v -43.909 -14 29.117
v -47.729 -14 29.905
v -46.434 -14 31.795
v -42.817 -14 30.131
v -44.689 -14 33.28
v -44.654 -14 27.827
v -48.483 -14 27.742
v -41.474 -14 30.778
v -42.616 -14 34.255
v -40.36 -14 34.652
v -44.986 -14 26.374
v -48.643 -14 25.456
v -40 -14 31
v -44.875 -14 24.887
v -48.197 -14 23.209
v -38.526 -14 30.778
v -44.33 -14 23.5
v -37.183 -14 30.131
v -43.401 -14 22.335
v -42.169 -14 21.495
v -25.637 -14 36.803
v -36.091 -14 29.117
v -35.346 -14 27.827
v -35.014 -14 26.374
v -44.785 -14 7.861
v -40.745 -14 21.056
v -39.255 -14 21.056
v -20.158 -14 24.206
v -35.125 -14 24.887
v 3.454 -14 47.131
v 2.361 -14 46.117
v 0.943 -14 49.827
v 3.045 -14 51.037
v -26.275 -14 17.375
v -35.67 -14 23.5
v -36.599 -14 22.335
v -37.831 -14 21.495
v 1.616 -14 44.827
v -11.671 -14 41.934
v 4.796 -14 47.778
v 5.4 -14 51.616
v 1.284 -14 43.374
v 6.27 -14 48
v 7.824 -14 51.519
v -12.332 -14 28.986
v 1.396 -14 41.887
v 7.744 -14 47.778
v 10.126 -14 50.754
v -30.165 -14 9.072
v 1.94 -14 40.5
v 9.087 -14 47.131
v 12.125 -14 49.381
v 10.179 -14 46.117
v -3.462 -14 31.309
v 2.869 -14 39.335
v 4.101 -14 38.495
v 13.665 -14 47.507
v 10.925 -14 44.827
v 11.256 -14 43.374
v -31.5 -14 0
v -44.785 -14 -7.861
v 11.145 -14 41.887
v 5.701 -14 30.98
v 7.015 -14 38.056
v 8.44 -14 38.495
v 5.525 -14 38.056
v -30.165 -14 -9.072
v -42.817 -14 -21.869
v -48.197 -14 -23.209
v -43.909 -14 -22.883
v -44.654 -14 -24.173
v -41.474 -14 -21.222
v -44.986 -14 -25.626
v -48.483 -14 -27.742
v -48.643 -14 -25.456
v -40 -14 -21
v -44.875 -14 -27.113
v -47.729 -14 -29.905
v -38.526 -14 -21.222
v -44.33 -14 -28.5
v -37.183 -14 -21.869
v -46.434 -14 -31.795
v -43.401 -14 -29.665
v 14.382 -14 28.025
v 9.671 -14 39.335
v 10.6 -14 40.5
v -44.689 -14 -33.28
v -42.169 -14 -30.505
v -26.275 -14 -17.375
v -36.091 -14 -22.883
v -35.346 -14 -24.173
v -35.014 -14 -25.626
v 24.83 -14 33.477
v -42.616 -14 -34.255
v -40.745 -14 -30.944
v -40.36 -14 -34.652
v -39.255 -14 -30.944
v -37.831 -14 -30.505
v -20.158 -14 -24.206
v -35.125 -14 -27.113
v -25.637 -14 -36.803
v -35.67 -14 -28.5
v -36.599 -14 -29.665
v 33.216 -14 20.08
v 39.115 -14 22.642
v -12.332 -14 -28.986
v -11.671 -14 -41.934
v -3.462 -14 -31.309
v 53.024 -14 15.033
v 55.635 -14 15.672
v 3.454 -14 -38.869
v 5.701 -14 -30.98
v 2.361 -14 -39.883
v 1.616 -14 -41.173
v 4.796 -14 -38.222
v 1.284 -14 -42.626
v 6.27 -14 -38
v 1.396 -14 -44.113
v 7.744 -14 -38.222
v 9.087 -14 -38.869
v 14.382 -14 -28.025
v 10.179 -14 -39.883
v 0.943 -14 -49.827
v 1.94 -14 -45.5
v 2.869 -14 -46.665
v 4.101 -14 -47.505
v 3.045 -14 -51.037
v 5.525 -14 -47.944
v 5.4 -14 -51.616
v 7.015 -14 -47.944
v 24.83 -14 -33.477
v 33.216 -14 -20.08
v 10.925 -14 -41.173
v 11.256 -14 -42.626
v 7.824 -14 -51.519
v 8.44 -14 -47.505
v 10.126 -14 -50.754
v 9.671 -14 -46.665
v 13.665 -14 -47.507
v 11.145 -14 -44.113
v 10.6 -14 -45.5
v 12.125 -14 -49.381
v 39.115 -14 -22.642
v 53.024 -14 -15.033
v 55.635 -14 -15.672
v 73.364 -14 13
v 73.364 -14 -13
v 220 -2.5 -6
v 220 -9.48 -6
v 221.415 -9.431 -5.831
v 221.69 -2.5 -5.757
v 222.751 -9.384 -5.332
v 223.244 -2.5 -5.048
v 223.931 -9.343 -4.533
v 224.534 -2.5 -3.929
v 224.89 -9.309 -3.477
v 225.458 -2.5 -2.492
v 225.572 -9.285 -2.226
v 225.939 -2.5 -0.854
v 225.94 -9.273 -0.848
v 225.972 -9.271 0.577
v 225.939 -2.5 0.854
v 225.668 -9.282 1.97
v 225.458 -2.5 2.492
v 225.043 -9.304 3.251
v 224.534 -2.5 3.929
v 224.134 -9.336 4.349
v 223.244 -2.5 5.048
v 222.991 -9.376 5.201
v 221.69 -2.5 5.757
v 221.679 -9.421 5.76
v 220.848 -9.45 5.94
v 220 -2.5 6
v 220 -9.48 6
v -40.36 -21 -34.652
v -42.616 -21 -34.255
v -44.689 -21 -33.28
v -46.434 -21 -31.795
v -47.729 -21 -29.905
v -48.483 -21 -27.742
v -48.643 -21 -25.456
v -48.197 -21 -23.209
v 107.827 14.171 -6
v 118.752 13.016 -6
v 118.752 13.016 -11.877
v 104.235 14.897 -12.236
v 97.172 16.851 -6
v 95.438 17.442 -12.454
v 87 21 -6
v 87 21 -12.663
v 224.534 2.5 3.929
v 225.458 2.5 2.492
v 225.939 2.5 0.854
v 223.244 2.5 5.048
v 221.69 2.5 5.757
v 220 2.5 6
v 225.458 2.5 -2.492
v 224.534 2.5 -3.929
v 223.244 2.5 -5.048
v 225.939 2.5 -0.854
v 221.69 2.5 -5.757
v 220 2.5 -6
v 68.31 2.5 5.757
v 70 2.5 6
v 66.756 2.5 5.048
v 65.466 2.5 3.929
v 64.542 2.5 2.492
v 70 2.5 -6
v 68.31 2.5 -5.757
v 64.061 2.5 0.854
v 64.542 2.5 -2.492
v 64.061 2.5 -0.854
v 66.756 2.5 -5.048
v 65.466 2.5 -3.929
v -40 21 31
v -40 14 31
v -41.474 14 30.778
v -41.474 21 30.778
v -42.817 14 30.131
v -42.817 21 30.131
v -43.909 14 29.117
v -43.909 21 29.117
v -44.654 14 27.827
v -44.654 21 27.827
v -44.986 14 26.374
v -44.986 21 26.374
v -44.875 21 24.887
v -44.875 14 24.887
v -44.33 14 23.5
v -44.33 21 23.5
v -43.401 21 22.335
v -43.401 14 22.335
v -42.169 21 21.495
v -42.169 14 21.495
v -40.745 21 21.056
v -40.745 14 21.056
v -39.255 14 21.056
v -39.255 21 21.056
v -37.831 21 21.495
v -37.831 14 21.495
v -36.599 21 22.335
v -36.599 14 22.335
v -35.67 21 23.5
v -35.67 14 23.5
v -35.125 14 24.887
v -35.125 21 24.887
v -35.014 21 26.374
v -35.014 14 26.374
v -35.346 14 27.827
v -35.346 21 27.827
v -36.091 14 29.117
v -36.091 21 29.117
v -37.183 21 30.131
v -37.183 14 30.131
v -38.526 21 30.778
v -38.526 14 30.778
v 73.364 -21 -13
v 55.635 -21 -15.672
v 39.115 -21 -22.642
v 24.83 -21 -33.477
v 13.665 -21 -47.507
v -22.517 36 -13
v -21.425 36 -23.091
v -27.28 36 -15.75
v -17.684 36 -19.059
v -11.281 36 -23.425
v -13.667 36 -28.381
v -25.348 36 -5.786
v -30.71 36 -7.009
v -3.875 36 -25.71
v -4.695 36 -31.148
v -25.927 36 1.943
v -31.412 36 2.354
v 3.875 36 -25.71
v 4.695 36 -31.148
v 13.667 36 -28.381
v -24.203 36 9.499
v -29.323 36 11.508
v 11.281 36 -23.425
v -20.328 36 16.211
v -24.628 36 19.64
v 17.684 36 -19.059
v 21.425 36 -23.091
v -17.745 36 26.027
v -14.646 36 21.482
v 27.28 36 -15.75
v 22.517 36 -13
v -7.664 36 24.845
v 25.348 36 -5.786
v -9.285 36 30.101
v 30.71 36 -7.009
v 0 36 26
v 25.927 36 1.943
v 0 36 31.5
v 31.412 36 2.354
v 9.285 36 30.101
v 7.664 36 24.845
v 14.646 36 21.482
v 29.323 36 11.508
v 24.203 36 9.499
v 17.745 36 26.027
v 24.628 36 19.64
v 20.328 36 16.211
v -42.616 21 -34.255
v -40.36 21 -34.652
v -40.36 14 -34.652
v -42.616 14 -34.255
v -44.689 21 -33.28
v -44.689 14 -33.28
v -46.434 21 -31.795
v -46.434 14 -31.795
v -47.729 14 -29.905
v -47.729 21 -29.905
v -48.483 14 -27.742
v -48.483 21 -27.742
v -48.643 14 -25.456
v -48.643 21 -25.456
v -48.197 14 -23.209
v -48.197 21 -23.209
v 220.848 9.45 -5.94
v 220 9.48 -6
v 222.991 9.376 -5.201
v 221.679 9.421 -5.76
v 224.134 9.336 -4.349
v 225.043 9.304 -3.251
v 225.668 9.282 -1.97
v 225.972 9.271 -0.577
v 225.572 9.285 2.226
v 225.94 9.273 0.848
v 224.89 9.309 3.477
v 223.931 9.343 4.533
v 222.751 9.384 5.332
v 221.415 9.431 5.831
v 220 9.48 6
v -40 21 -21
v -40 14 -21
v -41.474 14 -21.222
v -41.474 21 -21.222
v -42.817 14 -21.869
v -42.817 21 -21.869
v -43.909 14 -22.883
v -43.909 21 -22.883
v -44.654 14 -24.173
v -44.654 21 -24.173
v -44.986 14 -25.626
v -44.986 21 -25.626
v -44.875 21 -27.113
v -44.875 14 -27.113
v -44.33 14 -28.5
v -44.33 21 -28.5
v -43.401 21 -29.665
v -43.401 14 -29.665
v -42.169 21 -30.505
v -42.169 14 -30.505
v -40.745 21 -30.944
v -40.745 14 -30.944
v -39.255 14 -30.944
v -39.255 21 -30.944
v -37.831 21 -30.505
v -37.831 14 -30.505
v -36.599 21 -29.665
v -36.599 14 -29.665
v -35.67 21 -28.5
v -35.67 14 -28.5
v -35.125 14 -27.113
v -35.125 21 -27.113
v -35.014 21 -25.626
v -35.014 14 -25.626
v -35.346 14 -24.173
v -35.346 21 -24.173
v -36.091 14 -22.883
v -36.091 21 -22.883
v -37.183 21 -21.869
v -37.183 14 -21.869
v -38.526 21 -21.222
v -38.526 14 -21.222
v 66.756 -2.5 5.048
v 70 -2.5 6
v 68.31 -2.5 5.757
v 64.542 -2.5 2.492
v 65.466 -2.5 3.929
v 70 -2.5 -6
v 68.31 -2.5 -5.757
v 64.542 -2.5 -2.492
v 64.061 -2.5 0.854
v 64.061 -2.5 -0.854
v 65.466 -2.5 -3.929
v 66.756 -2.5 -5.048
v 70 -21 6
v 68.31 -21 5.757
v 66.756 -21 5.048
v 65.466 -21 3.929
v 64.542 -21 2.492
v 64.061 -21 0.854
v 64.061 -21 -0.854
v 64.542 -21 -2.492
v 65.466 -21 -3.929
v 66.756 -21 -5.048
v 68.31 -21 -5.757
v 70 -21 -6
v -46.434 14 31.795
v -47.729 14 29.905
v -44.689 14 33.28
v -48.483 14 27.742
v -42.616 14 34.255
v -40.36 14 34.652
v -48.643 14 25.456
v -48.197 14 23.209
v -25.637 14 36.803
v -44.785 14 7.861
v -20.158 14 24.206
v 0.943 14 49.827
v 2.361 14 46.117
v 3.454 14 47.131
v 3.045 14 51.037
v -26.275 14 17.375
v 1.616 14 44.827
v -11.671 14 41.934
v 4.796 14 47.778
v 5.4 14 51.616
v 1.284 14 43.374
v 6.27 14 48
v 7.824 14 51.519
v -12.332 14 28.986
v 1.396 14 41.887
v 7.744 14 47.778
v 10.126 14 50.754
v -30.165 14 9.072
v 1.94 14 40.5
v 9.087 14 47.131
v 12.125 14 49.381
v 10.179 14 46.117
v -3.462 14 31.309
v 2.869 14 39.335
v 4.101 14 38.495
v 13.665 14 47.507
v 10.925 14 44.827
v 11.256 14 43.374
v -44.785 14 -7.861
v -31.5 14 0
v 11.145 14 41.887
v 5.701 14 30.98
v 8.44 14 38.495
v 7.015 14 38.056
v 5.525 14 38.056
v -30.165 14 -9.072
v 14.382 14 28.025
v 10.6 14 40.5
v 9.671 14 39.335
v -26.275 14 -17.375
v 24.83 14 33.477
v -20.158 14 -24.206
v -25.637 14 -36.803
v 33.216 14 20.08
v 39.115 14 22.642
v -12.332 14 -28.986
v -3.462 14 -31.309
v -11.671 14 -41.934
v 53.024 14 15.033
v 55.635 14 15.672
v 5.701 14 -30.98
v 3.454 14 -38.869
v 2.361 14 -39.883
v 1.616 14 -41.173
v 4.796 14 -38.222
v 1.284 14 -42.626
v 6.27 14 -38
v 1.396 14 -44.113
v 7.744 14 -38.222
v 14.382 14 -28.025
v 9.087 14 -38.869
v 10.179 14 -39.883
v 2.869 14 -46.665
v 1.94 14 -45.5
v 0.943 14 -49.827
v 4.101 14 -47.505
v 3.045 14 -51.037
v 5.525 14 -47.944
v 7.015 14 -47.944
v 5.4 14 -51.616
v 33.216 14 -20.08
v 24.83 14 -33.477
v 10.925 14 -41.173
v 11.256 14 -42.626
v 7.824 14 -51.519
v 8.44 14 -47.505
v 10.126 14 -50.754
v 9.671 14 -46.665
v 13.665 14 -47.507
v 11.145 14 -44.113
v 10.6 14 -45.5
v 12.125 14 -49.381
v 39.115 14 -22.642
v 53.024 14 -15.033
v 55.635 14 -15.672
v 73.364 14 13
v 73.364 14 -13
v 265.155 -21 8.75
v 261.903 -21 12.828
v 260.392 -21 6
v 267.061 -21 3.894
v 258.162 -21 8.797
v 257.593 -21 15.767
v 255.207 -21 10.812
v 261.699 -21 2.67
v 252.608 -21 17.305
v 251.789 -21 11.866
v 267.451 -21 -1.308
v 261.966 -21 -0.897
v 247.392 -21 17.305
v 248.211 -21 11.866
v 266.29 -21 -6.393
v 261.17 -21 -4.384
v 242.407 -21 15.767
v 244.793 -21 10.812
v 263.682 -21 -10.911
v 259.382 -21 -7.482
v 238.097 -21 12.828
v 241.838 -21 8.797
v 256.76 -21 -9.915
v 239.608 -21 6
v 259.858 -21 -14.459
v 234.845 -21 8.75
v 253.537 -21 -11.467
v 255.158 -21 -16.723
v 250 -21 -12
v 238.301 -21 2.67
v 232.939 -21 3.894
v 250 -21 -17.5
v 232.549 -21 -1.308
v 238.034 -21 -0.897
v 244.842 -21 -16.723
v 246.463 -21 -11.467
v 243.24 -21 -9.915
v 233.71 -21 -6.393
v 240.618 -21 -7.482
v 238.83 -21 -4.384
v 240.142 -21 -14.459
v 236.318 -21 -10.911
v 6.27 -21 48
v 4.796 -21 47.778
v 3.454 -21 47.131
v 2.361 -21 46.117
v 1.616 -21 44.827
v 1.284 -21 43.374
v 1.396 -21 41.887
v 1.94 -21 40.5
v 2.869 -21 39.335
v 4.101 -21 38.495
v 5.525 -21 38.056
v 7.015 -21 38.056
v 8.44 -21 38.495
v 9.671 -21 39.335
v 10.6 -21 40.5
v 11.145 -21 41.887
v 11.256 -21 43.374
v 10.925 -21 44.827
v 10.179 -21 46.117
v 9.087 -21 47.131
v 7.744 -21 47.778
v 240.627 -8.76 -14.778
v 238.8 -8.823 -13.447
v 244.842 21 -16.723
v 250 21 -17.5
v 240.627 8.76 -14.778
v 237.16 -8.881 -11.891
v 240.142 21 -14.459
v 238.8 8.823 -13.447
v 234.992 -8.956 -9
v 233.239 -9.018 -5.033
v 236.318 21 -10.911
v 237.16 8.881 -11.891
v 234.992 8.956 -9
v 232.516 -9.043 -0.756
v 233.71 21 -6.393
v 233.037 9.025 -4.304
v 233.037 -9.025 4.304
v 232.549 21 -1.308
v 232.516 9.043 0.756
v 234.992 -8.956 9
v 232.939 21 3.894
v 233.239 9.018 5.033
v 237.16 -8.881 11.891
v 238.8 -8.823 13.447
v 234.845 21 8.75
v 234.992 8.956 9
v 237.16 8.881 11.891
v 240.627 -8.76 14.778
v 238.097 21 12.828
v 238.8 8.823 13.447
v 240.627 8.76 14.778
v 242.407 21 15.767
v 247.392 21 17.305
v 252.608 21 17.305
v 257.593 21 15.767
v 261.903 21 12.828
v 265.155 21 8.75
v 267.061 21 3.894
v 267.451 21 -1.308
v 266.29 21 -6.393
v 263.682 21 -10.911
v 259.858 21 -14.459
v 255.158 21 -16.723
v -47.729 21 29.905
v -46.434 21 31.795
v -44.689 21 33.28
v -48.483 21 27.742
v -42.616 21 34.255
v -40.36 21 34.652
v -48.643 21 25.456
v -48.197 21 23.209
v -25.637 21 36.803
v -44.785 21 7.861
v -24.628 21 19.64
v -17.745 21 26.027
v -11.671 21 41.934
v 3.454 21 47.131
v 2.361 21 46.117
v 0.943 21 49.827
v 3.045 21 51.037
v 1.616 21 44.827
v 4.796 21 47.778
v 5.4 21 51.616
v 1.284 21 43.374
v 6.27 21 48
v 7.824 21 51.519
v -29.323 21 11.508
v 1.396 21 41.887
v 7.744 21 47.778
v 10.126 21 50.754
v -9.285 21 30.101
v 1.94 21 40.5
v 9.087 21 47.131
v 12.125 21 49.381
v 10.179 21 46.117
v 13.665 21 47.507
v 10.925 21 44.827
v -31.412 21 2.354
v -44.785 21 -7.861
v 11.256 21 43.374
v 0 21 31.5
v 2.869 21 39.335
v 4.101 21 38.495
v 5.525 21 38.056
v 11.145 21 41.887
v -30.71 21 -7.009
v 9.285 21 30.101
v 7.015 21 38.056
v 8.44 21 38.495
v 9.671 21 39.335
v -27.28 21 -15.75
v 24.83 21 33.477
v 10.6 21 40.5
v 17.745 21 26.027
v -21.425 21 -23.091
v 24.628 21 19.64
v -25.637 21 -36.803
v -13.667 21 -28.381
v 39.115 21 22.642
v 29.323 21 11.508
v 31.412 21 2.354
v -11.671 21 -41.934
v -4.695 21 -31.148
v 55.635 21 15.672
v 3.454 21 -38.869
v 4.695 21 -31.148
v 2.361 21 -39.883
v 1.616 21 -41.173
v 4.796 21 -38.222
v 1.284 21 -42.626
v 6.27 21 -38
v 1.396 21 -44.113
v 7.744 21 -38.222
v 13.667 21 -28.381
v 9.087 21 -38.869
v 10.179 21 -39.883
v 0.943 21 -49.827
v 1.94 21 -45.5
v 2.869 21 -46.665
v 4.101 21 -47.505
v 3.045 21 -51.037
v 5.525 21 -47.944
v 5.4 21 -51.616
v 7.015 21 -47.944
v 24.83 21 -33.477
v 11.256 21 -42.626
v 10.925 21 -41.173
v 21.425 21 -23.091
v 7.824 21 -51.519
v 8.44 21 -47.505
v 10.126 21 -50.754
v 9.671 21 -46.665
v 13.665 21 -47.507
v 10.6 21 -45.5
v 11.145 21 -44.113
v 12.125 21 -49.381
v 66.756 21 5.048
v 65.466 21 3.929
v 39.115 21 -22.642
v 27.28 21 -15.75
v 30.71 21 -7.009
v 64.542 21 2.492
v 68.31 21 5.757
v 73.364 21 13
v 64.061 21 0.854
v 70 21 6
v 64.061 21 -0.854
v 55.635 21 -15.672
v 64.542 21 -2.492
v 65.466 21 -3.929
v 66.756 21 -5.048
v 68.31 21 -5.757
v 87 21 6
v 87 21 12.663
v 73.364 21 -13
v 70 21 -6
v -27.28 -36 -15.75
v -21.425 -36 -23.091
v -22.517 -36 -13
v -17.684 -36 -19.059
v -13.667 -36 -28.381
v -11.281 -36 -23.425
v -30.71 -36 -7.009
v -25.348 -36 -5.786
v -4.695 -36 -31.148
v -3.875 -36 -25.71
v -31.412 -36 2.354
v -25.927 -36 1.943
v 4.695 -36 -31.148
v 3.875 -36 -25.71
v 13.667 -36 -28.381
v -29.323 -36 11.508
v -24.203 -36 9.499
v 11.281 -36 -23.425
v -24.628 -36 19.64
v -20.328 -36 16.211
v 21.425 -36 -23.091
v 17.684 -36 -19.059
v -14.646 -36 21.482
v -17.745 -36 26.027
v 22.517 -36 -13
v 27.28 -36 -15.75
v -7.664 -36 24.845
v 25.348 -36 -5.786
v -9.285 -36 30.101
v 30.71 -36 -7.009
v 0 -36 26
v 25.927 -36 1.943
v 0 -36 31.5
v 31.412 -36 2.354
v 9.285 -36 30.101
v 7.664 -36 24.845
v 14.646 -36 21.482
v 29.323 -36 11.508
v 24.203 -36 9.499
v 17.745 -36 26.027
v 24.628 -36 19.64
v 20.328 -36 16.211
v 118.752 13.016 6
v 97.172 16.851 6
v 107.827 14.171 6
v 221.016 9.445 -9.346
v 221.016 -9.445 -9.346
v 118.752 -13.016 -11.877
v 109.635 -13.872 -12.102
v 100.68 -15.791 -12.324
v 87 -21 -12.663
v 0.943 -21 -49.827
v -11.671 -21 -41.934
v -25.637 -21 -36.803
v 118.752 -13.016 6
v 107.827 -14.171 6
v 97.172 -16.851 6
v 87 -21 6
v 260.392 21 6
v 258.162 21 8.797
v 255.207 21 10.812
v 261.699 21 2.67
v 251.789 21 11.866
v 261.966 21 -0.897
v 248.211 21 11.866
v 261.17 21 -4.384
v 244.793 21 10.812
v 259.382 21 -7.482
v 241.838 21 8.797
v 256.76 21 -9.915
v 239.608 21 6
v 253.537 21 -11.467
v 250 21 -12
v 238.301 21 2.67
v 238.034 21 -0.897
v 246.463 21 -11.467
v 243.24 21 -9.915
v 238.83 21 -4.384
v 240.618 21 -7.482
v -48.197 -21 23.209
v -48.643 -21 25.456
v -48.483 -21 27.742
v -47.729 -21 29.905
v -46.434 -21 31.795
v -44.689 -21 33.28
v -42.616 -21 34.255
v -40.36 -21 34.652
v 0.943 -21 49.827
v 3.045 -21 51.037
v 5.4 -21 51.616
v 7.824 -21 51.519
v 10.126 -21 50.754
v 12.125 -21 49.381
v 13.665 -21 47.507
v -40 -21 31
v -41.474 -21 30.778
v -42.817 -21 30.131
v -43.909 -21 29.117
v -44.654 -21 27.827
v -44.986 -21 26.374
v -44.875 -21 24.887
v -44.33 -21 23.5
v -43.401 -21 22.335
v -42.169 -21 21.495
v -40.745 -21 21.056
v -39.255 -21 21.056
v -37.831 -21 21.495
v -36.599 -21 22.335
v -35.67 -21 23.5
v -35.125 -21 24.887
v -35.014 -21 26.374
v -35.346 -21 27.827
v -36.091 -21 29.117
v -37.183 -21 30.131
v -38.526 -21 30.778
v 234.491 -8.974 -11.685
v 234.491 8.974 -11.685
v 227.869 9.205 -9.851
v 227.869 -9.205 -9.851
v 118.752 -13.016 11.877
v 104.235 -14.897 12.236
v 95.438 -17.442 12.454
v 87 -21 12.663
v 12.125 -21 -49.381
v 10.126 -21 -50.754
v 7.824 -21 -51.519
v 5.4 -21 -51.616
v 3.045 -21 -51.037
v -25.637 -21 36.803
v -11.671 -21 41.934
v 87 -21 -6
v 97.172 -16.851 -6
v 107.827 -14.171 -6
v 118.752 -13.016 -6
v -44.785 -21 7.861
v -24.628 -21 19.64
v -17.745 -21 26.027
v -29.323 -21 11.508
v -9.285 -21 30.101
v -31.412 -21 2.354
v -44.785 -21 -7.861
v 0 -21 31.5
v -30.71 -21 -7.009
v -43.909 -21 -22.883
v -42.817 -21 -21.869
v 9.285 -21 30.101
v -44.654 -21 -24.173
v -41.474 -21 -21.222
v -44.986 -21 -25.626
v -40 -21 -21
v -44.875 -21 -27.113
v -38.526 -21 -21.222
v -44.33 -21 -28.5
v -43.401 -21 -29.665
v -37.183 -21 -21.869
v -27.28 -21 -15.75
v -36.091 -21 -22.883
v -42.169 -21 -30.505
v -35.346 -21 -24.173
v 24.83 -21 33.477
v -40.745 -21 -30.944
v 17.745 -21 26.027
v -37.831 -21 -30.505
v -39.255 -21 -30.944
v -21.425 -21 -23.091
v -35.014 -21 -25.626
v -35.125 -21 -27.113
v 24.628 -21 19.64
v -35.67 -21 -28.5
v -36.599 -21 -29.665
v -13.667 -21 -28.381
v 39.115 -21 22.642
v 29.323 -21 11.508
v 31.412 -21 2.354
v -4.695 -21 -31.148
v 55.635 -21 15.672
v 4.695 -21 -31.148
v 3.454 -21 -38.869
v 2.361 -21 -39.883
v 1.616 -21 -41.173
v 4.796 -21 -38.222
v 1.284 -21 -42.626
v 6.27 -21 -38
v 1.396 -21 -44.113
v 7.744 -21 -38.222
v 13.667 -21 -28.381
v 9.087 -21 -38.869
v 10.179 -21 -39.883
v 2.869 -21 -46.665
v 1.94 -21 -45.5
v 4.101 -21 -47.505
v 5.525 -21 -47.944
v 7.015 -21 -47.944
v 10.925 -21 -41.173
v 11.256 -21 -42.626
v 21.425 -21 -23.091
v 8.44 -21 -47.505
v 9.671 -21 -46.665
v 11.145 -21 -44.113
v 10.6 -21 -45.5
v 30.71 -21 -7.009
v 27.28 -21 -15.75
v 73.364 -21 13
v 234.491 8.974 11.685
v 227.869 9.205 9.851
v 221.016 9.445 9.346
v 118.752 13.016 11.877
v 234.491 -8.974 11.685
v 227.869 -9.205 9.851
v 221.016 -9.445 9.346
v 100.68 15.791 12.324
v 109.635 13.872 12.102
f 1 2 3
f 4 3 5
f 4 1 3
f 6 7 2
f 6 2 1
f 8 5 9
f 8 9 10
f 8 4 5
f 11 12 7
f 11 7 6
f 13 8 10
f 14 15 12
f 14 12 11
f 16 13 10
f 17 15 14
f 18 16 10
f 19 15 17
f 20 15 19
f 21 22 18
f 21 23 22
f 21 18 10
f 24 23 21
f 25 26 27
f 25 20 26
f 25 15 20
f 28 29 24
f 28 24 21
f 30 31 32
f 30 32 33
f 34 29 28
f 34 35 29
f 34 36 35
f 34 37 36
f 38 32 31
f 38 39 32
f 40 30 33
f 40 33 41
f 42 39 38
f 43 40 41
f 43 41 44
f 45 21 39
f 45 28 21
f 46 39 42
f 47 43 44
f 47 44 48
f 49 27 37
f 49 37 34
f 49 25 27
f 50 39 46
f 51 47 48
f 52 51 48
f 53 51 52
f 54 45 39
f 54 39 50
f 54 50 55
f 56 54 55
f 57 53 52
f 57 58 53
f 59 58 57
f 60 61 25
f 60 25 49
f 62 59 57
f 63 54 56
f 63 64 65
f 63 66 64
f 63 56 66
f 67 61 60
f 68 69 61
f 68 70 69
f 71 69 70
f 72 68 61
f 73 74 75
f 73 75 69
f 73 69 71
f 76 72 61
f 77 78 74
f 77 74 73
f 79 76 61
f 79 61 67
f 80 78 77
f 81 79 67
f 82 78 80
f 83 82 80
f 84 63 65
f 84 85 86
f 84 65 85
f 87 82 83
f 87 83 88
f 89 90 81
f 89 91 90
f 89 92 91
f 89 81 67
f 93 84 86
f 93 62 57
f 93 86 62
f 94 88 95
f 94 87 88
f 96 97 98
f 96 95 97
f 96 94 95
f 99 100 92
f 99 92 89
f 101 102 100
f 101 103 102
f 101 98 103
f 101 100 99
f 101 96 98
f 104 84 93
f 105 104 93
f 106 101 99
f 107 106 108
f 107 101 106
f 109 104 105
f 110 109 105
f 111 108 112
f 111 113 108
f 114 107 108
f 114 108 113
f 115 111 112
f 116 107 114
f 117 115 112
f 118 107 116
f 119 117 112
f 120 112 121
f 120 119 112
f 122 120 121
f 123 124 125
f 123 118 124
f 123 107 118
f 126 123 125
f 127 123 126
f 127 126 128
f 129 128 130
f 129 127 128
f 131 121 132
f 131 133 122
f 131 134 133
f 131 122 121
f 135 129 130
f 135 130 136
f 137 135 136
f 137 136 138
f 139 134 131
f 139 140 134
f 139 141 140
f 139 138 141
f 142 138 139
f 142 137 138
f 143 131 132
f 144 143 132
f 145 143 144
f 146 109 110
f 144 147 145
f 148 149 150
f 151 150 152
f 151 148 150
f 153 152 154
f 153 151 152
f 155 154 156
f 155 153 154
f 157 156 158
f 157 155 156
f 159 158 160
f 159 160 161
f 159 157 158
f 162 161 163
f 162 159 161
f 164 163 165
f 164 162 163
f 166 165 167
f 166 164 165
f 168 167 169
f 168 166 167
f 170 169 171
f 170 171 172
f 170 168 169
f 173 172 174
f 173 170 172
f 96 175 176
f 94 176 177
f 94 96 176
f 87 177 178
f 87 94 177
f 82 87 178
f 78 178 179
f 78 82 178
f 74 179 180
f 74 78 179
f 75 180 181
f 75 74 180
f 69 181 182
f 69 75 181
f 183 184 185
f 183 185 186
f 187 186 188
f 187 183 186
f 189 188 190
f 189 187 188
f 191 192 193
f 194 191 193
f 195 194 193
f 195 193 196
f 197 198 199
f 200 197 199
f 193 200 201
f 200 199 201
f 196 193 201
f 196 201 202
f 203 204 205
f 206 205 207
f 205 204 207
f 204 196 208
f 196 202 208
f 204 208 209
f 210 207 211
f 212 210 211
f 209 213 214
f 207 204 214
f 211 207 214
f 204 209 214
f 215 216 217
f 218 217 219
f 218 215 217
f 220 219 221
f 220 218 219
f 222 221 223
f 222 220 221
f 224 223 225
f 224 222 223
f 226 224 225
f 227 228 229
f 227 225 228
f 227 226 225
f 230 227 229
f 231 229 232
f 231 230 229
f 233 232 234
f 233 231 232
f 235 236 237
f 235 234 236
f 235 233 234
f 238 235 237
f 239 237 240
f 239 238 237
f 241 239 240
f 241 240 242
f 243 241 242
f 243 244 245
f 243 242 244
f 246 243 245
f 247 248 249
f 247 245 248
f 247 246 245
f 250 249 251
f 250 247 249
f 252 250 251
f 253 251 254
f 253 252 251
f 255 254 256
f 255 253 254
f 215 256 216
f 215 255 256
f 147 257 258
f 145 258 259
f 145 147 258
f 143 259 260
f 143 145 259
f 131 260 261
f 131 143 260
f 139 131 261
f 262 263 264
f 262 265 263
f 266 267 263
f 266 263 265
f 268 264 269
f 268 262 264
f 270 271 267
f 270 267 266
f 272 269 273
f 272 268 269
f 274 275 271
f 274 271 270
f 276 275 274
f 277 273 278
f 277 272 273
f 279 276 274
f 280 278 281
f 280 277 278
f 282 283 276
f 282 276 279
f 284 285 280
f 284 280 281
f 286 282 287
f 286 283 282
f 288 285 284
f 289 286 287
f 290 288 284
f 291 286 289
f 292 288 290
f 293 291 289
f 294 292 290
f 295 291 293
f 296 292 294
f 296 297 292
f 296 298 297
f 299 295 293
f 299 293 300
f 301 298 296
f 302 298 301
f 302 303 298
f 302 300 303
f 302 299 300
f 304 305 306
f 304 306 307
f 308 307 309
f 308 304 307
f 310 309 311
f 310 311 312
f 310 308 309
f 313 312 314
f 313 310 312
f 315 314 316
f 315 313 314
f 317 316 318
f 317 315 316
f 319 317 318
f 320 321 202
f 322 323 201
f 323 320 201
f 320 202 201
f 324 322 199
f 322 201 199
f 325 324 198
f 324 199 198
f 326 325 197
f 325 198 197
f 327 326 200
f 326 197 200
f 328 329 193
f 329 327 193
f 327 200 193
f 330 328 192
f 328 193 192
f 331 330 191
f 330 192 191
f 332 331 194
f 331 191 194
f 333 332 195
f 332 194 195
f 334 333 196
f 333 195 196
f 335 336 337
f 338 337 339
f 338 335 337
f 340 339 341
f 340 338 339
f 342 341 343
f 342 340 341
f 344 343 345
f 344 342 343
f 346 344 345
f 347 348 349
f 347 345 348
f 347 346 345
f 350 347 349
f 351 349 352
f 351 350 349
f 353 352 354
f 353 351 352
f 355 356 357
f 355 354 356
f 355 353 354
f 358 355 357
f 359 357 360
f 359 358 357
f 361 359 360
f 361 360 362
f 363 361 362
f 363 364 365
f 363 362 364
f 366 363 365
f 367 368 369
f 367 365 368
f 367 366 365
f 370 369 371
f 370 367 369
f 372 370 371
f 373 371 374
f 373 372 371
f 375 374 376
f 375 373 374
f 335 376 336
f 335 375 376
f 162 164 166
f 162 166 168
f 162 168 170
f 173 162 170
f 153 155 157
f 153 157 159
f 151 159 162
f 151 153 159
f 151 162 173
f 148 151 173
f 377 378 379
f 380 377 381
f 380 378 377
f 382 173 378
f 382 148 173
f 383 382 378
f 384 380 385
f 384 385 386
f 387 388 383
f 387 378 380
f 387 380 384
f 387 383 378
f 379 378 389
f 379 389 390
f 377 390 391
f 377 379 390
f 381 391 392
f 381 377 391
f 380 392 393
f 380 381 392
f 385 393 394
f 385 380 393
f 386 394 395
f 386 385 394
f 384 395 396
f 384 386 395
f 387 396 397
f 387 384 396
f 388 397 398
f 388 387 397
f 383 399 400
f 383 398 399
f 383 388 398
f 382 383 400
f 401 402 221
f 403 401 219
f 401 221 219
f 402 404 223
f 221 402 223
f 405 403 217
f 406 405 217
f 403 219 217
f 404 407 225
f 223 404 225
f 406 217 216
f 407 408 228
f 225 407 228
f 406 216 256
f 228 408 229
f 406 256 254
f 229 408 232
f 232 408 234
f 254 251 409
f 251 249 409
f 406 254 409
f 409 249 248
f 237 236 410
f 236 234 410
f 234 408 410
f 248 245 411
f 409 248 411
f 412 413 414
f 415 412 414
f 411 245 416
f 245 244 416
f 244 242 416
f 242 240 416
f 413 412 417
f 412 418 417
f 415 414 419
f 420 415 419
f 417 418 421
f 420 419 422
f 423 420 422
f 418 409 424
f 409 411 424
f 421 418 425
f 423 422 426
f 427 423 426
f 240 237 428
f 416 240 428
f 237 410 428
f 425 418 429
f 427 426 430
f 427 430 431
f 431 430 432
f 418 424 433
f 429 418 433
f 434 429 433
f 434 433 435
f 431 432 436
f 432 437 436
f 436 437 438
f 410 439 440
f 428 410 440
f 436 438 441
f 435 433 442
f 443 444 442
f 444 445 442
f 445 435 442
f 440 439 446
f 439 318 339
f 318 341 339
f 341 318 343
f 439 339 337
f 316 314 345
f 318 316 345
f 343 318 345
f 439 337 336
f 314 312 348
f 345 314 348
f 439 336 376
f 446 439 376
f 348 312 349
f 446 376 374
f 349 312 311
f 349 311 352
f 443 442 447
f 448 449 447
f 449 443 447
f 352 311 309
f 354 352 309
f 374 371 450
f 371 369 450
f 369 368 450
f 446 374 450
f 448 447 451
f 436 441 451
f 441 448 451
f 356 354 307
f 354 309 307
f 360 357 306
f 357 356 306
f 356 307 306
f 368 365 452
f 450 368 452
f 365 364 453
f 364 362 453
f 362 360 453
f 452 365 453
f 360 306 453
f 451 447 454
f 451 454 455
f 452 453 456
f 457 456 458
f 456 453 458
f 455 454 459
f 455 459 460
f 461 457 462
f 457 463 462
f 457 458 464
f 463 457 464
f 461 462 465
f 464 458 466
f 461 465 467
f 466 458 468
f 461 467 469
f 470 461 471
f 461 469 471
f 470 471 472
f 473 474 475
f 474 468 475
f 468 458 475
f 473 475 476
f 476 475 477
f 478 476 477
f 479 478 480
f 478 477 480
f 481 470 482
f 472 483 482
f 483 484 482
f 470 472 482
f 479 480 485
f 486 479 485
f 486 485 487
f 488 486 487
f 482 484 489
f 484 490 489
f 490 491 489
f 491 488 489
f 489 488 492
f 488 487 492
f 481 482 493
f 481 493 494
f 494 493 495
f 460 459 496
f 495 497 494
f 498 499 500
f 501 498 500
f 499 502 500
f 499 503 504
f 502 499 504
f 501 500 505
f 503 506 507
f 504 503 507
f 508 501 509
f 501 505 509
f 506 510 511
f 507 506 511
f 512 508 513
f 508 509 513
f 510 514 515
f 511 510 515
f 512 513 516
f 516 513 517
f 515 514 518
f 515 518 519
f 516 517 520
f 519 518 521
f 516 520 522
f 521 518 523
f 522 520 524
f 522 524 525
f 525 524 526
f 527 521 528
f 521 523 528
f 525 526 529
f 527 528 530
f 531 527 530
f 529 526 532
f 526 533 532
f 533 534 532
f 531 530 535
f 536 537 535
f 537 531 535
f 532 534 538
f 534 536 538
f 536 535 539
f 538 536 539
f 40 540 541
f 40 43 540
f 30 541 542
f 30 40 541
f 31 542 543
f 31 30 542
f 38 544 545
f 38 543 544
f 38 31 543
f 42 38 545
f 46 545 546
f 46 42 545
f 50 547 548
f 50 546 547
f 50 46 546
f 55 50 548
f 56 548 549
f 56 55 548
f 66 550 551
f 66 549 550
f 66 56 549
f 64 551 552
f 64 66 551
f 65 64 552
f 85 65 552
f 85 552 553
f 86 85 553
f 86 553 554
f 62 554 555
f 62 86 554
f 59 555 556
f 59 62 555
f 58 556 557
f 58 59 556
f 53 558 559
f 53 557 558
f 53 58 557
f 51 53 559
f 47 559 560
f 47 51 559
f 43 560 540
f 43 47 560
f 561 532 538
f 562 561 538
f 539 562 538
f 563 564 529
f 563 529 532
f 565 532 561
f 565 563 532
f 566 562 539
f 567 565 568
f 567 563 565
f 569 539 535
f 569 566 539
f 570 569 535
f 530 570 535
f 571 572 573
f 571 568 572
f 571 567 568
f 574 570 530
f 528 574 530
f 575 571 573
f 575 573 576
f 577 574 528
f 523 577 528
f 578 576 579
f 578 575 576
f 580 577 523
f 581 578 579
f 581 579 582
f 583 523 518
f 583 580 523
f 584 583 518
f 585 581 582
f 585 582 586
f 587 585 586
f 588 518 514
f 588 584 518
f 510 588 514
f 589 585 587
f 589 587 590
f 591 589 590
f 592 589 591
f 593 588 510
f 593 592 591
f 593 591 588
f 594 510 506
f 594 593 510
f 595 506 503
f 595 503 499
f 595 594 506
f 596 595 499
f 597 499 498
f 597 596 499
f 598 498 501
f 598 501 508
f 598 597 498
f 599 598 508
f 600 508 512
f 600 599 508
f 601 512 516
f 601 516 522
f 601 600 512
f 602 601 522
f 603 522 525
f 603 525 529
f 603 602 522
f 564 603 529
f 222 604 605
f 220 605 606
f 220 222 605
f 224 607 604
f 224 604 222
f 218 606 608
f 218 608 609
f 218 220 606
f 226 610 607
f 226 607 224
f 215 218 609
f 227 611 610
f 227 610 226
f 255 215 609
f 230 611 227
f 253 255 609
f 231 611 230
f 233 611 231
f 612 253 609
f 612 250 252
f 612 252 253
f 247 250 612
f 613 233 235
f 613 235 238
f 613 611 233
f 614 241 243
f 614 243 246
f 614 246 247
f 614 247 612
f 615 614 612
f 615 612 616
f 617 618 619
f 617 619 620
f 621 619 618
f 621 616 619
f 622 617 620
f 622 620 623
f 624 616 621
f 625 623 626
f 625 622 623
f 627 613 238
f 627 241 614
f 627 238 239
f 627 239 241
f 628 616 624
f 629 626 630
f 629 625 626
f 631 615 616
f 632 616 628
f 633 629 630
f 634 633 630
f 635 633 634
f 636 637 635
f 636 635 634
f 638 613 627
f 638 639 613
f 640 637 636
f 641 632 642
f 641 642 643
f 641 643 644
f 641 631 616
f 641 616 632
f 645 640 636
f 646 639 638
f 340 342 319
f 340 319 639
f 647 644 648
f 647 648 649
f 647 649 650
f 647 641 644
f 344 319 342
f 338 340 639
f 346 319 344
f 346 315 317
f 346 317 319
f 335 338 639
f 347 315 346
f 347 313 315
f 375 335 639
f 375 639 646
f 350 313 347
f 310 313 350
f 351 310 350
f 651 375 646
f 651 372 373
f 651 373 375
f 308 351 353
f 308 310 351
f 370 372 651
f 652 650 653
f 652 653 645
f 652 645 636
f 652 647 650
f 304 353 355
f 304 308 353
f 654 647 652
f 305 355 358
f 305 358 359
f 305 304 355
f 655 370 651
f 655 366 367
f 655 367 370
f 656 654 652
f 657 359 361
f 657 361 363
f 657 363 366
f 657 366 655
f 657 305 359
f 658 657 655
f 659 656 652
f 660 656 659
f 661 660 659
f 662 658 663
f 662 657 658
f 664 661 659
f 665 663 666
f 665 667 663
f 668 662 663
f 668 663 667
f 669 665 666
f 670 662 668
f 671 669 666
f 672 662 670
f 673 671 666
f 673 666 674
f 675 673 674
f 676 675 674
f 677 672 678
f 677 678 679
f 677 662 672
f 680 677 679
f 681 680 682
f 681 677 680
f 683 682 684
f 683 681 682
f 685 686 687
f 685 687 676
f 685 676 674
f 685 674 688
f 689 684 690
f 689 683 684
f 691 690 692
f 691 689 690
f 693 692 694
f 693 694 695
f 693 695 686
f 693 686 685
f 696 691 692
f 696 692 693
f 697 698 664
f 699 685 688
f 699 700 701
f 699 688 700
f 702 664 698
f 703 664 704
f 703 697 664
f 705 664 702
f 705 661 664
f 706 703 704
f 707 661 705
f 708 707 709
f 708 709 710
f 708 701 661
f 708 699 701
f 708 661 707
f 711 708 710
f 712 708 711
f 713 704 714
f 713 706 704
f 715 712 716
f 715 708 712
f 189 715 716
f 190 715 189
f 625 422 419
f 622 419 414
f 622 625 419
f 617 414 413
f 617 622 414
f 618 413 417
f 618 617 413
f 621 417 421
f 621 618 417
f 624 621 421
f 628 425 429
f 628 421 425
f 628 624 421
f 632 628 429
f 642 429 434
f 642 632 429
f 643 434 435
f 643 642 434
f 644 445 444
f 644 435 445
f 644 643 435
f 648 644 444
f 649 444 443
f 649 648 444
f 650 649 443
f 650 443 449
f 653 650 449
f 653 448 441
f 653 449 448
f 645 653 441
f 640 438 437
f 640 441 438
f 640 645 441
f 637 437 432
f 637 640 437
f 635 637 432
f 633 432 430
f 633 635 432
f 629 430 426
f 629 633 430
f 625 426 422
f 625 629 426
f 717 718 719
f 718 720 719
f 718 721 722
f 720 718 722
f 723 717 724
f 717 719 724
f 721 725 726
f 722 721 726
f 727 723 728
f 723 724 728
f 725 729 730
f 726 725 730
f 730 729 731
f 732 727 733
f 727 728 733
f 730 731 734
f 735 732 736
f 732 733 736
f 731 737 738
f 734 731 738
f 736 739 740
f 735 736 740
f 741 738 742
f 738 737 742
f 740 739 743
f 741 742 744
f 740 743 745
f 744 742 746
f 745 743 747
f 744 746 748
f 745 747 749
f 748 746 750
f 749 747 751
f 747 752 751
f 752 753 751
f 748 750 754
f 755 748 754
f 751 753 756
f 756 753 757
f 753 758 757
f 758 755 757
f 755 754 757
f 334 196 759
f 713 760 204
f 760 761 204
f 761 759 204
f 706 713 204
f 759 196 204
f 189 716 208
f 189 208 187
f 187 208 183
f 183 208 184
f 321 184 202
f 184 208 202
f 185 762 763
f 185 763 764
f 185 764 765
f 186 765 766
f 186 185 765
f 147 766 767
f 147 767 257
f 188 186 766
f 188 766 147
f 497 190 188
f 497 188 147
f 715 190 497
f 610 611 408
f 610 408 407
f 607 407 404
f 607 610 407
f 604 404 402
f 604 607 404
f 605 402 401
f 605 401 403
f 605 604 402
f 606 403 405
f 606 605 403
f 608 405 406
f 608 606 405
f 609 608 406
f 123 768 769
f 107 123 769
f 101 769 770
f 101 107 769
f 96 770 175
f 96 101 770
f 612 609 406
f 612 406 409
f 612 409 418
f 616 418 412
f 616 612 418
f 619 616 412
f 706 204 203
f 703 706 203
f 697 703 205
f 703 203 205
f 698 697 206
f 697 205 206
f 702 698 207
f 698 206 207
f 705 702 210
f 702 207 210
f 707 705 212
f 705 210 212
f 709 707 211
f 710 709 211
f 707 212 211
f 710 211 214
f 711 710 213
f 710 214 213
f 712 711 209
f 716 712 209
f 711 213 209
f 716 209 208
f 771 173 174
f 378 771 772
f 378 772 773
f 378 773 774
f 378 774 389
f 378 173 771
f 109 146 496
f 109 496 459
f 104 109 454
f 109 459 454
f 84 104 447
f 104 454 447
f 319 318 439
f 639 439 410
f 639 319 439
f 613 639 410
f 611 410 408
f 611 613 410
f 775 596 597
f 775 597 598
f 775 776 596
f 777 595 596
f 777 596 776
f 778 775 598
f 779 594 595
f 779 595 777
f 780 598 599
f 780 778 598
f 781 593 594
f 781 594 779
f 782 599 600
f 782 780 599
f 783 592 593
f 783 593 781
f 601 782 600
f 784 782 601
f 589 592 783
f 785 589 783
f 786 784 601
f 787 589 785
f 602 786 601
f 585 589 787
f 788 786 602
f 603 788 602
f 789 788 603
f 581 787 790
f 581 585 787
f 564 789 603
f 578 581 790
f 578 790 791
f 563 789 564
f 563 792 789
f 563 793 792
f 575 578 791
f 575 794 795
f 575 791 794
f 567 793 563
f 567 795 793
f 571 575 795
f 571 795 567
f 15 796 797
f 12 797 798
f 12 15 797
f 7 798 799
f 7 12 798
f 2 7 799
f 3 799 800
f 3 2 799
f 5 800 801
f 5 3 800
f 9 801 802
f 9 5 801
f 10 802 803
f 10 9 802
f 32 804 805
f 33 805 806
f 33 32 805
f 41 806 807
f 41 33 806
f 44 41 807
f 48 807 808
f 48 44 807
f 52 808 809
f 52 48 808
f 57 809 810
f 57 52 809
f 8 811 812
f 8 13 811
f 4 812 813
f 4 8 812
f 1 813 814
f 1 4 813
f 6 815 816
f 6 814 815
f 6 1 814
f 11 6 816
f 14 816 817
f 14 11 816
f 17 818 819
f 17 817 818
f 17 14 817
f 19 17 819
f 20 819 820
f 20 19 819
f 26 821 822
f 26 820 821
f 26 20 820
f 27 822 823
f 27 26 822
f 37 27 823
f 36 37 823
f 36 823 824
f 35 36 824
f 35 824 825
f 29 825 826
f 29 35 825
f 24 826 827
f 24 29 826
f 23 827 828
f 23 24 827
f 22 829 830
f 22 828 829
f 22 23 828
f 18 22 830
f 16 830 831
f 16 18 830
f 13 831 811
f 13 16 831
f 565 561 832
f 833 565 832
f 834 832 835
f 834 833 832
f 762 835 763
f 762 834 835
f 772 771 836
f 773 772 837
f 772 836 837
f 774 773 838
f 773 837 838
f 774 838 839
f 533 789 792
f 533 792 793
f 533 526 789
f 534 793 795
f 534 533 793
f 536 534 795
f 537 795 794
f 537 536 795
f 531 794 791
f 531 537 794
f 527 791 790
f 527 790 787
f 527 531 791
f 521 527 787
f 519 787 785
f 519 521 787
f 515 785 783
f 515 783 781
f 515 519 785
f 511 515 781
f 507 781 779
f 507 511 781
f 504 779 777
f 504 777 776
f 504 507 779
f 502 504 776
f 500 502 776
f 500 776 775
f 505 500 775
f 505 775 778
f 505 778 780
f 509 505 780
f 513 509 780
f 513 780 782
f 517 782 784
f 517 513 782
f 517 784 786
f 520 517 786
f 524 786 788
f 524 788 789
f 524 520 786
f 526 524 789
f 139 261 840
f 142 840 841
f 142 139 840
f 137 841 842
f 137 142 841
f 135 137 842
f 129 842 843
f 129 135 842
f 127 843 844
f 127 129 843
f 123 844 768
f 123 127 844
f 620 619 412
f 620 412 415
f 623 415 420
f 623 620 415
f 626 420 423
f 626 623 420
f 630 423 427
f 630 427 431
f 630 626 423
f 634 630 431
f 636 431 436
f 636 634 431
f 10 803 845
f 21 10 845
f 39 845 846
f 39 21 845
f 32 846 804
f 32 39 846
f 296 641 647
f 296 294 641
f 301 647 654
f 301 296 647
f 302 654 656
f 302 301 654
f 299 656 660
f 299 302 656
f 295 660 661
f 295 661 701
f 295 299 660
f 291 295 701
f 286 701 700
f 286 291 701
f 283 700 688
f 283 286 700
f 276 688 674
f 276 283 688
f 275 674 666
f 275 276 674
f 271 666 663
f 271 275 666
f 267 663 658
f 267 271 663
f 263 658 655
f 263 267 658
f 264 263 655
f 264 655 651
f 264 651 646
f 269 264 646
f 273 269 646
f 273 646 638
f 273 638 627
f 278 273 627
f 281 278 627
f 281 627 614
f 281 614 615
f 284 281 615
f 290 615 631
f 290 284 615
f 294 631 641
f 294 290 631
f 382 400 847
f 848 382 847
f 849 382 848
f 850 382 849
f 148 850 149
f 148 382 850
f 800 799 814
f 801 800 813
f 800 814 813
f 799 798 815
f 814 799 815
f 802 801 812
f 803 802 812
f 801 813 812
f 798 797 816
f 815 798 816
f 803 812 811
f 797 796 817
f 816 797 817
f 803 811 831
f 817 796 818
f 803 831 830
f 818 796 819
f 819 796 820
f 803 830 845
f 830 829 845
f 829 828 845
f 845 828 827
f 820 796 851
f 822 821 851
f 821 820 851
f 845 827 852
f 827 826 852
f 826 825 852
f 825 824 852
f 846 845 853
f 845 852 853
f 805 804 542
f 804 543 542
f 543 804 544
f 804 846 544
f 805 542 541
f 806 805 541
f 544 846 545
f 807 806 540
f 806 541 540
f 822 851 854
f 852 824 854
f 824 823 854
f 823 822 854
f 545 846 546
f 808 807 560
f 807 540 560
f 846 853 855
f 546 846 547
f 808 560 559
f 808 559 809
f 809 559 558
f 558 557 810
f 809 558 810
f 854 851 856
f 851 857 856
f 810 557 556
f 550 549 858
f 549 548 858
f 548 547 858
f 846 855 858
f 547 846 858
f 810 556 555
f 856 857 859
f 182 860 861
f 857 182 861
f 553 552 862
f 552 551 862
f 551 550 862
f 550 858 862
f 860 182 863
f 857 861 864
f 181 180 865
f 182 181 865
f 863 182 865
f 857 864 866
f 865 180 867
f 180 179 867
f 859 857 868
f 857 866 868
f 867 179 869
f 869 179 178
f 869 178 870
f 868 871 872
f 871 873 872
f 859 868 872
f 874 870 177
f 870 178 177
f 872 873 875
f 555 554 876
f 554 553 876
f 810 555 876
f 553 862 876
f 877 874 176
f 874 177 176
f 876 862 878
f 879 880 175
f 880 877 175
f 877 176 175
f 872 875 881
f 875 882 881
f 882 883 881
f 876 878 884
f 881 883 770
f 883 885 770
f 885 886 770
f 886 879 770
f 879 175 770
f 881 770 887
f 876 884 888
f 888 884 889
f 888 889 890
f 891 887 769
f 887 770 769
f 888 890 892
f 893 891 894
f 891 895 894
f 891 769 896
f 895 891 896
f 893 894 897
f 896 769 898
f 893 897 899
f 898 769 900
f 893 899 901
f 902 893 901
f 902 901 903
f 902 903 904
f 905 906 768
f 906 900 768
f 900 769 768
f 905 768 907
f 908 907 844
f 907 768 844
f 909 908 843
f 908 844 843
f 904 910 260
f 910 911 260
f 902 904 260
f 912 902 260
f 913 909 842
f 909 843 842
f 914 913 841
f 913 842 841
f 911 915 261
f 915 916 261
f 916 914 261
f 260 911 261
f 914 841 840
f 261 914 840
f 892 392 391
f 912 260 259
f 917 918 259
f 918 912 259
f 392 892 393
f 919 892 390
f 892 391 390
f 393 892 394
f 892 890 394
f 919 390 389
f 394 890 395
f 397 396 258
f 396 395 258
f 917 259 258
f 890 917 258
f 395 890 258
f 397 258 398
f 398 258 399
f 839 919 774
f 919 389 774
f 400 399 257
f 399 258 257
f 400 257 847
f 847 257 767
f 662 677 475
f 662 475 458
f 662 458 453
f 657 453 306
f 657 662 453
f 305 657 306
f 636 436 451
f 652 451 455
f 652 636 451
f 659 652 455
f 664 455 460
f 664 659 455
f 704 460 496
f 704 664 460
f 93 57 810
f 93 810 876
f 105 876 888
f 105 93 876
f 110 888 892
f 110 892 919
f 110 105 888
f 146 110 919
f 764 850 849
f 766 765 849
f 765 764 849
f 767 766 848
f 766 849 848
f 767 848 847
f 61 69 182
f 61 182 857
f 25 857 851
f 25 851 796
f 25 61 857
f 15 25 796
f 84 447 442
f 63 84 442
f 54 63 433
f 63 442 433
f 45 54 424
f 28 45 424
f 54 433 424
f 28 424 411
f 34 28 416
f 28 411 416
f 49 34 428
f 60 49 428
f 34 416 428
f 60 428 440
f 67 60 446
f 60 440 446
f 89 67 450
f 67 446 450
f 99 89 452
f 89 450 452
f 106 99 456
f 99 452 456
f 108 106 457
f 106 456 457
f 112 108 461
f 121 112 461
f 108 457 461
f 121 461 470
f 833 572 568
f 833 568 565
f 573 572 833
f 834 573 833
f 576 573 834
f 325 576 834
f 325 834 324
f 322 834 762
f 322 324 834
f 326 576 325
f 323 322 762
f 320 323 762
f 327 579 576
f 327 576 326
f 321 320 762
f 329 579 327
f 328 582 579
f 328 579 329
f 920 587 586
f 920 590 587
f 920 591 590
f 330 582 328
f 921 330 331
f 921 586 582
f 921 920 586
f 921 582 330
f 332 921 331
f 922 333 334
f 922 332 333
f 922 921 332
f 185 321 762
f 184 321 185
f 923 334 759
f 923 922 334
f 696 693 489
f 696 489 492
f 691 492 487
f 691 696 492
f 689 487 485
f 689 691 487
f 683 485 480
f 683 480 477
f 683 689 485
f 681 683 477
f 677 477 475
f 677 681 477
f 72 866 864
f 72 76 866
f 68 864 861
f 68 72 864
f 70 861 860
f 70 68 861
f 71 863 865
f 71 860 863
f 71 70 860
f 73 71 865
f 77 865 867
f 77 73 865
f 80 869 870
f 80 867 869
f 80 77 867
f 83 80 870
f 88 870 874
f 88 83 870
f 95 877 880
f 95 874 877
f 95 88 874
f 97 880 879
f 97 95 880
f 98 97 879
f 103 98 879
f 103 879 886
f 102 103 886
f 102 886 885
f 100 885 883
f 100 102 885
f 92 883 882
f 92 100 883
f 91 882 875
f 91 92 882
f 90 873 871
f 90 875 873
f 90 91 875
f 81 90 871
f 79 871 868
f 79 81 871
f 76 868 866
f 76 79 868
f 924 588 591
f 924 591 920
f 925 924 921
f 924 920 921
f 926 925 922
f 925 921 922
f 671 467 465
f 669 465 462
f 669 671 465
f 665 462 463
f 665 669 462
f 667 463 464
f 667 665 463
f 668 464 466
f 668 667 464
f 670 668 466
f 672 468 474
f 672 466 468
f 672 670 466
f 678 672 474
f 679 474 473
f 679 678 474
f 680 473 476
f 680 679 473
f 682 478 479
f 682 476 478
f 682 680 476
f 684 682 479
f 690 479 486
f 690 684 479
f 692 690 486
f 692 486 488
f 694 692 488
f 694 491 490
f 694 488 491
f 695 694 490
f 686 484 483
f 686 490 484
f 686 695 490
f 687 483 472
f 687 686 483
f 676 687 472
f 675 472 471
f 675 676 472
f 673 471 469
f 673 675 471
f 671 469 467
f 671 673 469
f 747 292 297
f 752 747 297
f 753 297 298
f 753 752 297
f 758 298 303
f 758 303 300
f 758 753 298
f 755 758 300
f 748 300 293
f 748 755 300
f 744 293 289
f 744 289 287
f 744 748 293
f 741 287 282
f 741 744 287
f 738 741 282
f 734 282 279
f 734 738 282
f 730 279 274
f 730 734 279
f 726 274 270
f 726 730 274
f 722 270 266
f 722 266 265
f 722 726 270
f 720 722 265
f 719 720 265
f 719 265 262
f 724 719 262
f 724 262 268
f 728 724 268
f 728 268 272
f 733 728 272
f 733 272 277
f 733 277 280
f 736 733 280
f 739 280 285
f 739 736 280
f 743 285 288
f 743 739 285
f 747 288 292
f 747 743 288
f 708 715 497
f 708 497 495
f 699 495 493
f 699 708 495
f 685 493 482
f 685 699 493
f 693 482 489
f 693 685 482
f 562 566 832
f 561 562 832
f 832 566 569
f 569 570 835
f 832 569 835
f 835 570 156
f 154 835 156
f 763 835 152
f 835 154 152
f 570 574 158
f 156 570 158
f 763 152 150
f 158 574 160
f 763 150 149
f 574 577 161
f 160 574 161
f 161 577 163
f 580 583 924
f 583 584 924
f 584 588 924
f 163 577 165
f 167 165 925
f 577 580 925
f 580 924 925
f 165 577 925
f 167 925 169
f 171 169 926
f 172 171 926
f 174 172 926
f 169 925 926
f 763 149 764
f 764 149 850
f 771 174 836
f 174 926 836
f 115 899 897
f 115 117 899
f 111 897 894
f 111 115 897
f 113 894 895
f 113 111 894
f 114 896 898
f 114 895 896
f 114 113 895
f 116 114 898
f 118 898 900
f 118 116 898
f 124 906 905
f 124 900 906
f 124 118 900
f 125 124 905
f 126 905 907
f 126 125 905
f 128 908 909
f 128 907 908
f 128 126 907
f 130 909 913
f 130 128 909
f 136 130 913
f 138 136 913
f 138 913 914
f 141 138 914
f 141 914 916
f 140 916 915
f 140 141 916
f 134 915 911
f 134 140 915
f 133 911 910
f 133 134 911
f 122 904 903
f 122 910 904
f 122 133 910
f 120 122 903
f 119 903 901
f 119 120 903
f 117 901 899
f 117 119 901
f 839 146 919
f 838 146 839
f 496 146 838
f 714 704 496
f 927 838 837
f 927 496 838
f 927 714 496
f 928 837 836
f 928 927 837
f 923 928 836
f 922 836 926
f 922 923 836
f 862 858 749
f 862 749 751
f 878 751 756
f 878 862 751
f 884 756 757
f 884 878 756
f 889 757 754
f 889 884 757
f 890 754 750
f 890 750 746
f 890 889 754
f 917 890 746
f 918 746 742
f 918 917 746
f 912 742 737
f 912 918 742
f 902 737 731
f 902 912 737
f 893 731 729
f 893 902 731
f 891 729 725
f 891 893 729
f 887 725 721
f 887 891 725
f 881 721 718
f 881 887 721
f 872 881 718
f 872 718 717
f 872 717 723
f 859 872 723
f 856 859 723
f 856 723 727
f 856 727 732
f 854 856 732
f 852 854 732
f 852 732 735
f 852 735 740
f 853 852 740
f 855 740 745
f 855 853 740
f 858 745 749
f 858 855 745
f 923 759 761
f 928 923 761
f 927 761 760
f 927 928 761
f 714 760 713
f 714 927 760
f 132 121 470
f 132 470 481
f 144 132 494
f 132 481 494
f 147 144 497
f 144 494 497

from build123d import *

# Parameters (mm, degrees)
SKETCH1_R                           = 31.5
SKETCH1_R_2                         = 26
BOSS_EXTRUDE4_DEPTH                 = 36
SKETCH1_6_R                         = 31.5
BOSS_EXTRUDE5_DEPTH                 = 21
SKETCH1_7_R                         = 17.499999999999996
SKETCH1_7_R_2                       = 12.000000000000032
BOSS_EXTRUDE6_DEPTH                 = 21
CUT_EXTRUDE2_DEPTH                  = 14
F_10_0_10_DIAMETER_HOLE1_AT_2_COUNT = 2
F_10_0_10_DIAMETER_HOLE1_AT_2_PITCH = 49.29432288112943
F_10_0_10_DIAMETER_HOLE1_AT_3_COUNT = 2
F_10_0_10_DIAMETER_HOLE1_AT_3_PITCH = 83.07785666655731
F_10_0_10_DIAMETER_HOLE1_AT_4_COUNT = 2
F_10_0_10_DIAMETER_HOLE1_AT_4_PITCH = 86
CUT_EXTRUDE3_DEPTH                  = 275.8107850129084
CUT_EXTRUDE5_START                  = 2.5
CUT_EXTRUDE5_DEPTH                  = 273.3107850129084
FILLET1_R                           = 35


with BuildPart() as part:
    # Sketch1 → Boss-Extrude4 (new, symmetric)
    with BuildSketch(Plane(origin=(0, 0, 0), x_dir=(1, 0, 0), z_dir=(0, 1, 0))):
        with Locations(Location((0, 0, 0), (0, 0, 270))):
            Circle(SKETCH1_R)
        with Locations(Location((0, 0, 0), (0, 0, 270))):
            Circle(SKETCH1_R_2, mode=Mode.SUBTRACT)
    extrude(amount=BOSS_EXTRUDE4_DEPTH, both=True)

    # Sketch1<6> → Boss-Extrude5 (add, symmetric)
    with BuildSketch(Plane(origin=(0, 0, 0), x_dir=(1, 0, 0), z_dir=(0, 1, 0))):
        with BuildLine():
            Line((73.36430221224288, -13), (234.99166898019635, -9))
            ThreePointArc((234.99166898019635, -8.999999999999988), (232.5, 2.14e-15), (234.99166898019635, 8.999999999999991))
            Line((234.99166898019635, 9), (73.36430221224288, 13))
            ThreePointArc((73.36430221224288, 13), (39.114969977483554, 22.641845358080204), (13.664667255675049, 47.506761038700624))
            ThreePointArc((13.664667255675045, 47.50676103870063), (7.823940970794196, 51.519100534686345), (0.9428180059327183, 49.82703123693257))
            ThreePointArc((0.9428180059327147, 49.827031236932584), (-18.520838663158816, 39.007076929693255), (-40.35979444370536, 34.65215413378165))
            ThreePointArc((-40.35979444370536, 34.65215413378164), (-47.144575584343094, 30.893287536620406), (-48.19740860349871, 23.20863556952498))
            ThreePointArc((-48.1974086034987, 23.208635569524983), (-44.3542808542188, 3.55e-15), (-48.19740860349869, -23.208635569524983))
            ThreePointArc((-48.19740860349871, -23.20863556952498), (-47.144575584343094, -30.893287536620406), (-40.35979444370536, -34.65215413378164))
            ThreePointArc((-40.35979444370536, -34.65215413378165), (-18.520838663158816, -39.007076929693255), (0.9428180059327147, -49.827031236932584))
            ThreePointArc((0.9428180059327183, -49.82703123693257), (7.823940970794196, -51.519100534686345), (13.664667255675045, -47.50676103870063))
            ThreePointArc((13.664667255675049, -47.506761038700624), (39.114969977483554, -22.641845358080204), (73.36430221224288, -13))
        make_face()
        with Locations(Location((0, 0, 0), (0, 0, 270))):
            Circle(SKETCH1_6_R, mode=Mode.SUBTRACT)
    extrude(amount=BOSS_EXTRUDE5_DEPTH, both=True)

    # Sketch3 → Cut-Extrude2 (cut, symmetric)
    with BuildSketch(Plane(origin=(0, 0, 0), x_dir=(1, 0, 0), z_dir=(0, 1, 0))):
        with BuildLine():
            ThreePointArc((13.664667255675027, -47.50676103870063), (39.11496997748354, -22.64184535808019), (73.36430221224288, -13))
            ThreePointArc((73.36430221224288, -13), (43.025431211720246, -17.18539121666319), (14.381730442456515, -28.025271265065697))
            ThreePointArc((14.38173044245655, -28.025271265065726), (-31.5, -1.013e-14), (14.381730442456531, 28.025271265065733))
            ThreePointArc((14.381730442456515, 28.025271265065697), (43.025431211720246, 17.18539121666319), (73.36430221224288, 13))
            ThreePointArc((73.36430221224288, 12.999999999999986), (39.11496997748353, 22.64184535808019), (13.664667255675035, 47.50676103870063))
            ThreePointArc((13.664667255675045, 47.50676103870064), (7.823940970794192, 51.519100534686345), (0.9428180059327165, 49.82703123693258))
            ThreePointArc((0.9428180059327147, 49.82703123693257), (-18.520838663158813, 39.00707692969324), (-40.35979444370537, 34.65215413378162))
            ThreePointArc((-40.35979444370537, 34.652154133781636), (-47.14457558434309, 30.89328753662039), (-48.197408603498715, 23.20863556952498))
            ThreePointArc((-48.19740860349873, 23.208635569524986), (-44.354280854218786, 5.33e-15), (-48.1974086034987, -23.20863556952498))
            ThreePointArc((-48.19740860349871, -23.20863556952498), (-47.14457558434308, -30.89328753662039), (-40.35979444370537, -34.652154133781636))
            ThreePointArc((-40.359794443705375, -34.65215413378162), (-18.520838663158816, -39.00707692969324), (0.9428180059327218, -49.82703123693256))
            ThreePointArc((0.9428180059327174, -49.82703123693258), (7.8239409707941885, -51.51910053468634), (13.664667255675035, -47.50676103870063))
        make_face()
    extrude(amount=CUT_EXTRUDE2_DEPTH, both=True, mode=Mode.SUBTRACT)

    # Sketch6 → Ø10.0 (10) Diameter Hole1 (revolve, cut)
    with BuildSketch(Plane(origin=(6.270187683961703, 21, -43), x_dir=(0, 0, 1), z_dir=(1, 0, 0))):
        Polygon((0, 0), (-1.396e-14, 56.99999999999999), (4.999999999999993, 56.99999999999999), (5, 5.5e-16), align=None)
    f_10_0_10_diameter_hole1 = revolve(axis=Axis((6.270187683961703, 27.34999999999999, -43), (0, -1, 0)), mode=Mode.SUBTRACT)

    # Ø10.0 (10) Diameter Hole1 at 2: Ø10.0 (10) Diameter Hole1 ×2
    with Locations(*[Vector(-0.9386514507063974, 0, 0.3448672992424417) * (i * F_10_0_10_DIAMETER_HOLE1_AT_2_PITCH) for i in range(1, F_10_0_10_DIAMETER_HOLE1_AT_2_COUNT)]):
        add(f_10_0_10_diameter_hole1, mode=Mode.SUBTRACT)

    # Ø10.0 (10) Diameter Hole1 at 3: Ø10.0 (10) Diameter Hole1 ×2
    with Locations(*[Vector(-0.5569497040549868, 0, 0.8305462221653065) * (i * F_10_0_10_DIAMETER_HOLE1_AT_3_PITCH) for i in range(1, F_10_0_10_DIAMETER_HOLE1_AT_3_COUNT)]):
        add(f_10_0_10_diameter_hole1, mode=Mode.SUBTRACT)

    # Ø10.0 (10) Diameter Hole1 at 4: Ø10.0 (10) Diameter Hole1 ×2
    with Locations(*[(0, 0, i * F_10_0_10_DIAMETER_HOLE1_AT_4_PITCH) for i in range(1, F_10_0_10_DIAMETER_HOLE1_AT_4_COUNT)]):
        add(f_10_0_10_diameter_hole1, mode=Mode.SUBTRACT)

    # Sketch7 → Cut-Extrude3 (cut, symmetric)
    with BuildSketch(Plane.XY):
        with BuildLine():
            Line((233.74583449009816, 9.00000000000001), (118.75183062971695, 13.015679101740716))
            ThreePointArc((118.75183062971695, 13.015679101740716), (102.45227278301908, 15.323109429183773), (87, 21))
            Line((87, 21), (233.74583449009816, 21))
            Line((233.74583449009816, 21), (250, 21))
            Line((250, 21), (250, 8.432392032948131))
            Line((250, 8.432392032948131), (233.74583449009816, 9.00000000000001))
        make_face()
    cut_extrude3 = extrude(amount=CUT_EXTRUDE3_DEPTH, both=True, mode=Mode.SUBTRACT)

    # Mirror1: Cut-Extrude3 across plane
    add(cut_extrude3.mirror(Plane.ZX), mode=Mode.SUBTRACT)

    # Sketch8 → Cut-Extrude5 (cut, through all)
    with BuildSketch(Plane(origin=(0, 0, 0), x_dir=(1, 0, 0), z_dir=(0, 1, 0)).offset(CUT_EXTRUDE5_START)):
        with BuildLine():
            Line((70, 6), (220, 6))
            ThreePointArc((220, 6), (226, 0), (220, -6))
            Line((220, -6), (70, -6))
            ThreePointArc((70, -6), (64.00000000000003, 7.3e-16), (70, 6))
        make_face()
    cut_extrude5 = extrude(amount=CUT_EXTRUDE5_DEPTH, mode=Mode.SUBTRACT)

    # Mirror2: Cut-Extrude5 across plane
    add(cut_extrude5.mirror(Plane.ZX), mode=Mode.SUBTRACT)


with BuildPart() as body_2:
    # Sketch1<7> → Boss-Extrude6 (new, symmetric)
    with BuildSketch(Plane(origin=(0, 0, 0), x_dir=(1, 0, 0), z_dir=(0, 1, 0))):
        with Locations(Location((250, 0, 0), (0, 0, 90))):
            Circle(SKETCH1_7_R)
        with Locations(Location((250, 0, 0), (0, 0, 90))):
            Circle(SKETCH1_7_R_2, mode=Mode.SUBTRACT)
    extrude(amount=BOSS_EXTRUDE6_DEPTH, both=True)


with BuildPart() as part_1:
    add(part.part)

    # Combine1: union body 2
    add(body_2.part)

    # Fillet1
    fillet1_edges = [part_1.edges().sort_by_distance(p)[0] for p in [
        (234.99166898019635, 0, -8.999999999999996),
        (234.99166898019635, 0, 8.999999999999995),
    ]]
    fillet(fillet1_edges, radius=FILLET1_R)


solid = part_1.part
